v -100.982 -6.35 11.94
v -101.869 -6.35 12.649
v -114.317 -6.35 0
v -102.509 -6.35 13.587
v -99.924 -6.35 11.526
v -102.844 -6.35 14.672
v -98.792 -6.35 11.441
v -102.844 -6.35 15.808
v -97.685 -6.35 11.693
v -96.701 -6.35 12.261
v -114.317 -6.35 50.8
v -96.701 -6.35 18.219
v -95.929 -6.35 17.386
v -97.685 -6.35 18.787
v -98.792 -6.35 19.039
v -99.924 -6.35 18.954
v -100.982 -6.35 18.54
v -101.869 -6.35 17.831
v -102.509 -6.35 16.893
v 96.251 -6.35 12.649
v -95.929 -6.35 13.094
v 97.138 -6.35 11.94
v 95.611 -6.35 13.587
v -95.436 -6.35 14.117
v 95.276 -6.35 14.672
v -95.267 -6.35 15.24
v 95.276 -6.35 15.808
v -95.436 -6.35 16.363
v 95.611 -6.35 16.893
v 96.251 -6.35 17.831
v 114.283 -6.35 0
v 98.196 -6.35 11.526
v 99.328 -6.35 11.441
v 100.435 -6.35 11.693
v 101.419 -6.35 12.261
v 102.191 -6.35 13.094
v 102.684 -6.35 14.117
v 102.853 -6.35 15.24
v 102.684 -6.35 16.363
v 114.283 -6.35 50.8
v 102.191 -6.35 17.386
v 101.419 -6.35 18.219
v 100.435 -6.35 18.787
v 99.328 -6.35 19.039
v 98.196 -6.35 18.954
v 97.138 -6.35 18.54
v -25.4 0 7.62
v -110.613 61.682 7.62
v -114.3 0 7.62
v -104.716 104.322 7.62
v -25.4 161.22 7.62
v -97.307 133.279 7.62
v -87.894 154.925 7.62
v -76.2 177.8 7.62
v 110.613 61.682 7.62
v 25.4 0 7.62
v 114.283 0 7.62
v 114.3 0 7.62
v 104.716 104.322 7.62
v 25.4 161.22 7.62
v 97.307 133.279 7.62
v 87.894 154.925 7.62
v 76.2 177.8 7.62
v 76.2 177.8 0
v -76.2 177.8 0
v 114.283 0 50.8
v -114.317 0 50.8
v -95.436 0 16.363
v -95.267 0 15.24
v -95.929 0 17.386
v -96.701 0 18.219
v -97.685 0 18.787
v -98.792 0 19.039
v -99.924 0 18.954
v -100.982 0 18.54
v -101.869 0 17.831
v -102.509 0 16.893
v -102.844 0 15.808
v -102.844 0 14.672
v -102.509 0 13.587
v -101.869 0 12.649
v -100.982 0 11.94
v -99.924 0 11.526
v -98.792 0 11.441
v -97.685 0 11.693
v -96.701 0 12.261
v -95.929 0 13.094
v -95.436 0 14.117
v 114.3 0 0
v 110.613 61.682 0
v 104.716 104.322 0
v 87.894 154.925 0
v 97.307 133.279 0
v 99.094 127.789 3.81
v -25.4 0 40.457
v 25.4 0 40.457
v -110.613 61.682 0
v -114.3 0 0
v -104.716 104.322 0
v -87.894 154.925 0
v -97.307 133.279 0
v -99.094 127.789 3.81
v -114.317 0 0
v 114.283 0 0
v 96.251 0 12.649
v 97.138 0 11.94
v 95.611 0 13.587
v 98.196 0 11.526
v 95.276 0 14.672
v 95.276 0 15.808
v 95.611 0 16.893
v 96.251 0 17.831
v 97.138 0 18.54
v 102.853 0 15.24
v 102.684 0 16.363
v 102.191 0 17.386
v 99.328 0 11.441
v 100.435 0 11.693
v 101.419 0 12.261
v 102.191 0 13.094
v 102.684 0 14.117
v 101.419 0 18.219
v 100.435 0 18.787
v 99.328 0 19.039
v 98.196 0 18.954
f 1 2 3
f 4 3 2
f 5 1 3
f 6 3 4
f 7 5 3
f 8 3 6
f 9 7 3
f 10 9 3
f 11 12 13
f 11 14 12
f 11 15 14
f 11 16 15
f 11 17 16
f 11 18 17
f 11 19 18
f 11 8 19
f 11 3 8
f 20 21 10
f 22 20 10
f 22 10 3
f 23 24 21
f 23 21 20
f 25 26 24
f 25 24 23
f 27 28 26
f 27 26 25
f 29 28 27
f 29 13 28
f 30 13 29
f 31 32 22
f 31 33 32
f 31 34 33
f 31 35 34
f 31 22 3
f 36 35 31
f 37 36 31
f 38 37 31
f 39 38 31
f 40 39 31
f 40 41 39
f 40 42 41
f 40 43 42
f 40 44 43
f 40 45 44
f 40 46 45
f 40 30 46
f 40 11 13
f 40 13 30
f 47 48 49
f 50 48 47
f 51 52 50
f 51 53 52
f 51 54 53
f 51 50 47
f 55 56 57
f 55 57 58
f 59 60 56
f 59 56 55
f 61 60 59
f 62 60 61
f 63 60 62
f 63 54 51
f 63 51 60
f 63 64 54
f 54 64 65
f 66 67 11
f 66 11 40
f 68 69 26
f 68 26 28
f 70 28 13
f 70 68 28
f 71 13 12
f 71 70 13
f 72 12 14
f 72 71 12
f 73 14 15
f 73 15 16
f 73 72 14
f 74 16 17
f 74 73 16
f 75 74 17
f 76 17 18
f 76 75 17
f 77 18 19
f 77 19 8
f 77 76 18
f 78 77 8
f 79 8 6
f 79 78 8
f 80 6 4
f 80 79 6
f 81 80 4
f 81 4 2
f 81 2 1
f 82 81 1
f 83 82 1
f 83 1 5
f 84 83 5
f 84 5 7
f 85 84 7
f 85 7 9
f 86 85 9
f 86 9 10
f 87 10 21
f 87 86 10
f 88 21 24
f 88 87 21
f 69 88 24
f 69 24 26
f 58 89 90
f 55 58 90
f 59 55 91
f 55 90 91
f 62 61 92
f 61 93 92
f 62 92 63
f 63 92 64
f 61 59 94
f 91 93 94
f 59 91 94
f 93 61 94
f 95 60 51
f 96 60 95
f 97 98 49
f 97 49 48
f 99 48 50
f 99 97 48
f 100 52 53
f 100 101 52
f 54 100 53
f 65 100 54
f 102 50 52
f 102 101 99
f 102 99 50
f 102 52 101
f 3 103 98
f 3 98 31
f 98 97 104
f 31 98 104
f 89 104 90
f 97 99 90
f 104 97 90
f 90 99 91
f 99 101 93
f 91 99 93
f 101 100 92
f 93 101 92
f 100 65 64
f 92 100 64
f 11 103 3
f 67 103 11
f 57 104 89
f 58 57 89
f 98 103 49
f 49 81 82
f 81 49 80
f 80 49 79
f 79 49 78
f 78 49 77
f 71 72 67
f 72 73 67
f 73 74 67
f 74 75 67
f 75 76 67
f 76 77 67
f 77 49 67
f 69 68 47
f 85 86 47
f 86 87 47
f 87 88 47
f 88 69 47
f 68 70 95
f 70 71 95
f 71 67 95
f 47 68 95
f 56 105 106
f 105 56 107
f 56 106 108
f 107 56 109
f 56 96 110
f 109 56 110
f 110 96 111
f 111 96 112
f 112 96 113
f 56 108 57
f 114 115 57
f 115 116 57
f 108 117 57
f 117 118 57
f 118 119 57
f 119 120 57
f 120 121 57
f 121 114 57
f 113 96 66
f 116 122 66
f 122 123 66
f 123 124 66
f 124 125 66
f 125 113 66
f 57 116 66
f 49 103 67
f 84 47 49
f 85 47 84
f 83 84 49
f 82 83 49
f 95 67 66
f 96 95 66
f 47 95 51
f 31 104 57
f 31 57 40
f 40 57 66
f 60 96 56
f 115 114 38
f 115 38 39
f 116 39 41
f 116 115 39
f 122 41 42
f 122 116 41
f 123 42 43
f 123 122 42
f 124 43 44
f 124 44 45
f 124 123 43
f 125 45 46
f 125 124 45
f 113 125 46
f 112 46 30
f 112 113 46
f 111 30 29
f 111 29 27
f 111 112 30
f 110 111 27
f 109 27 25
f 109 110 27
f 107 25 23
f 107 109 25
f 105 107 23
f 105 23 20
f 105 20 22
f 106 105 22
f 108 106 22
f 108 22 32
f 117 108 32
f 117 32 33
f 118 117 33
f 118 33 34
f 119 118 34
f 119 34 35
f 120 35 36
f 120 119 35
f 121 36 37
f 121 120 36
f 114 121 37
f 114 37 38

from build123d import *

# Parameters (mm, degrees)
F1_W          = 228.6
F1_H          = 50.8
F1_R          = 3.81
F2_DEPTH      = 6.35
F3_DEPTH      = 7.62
F5_DEPTH      = 25.4
F5_DEPTH_BACK = 25.4


with BuildPart() as f2:
    # F1 (on Front) → F2 (new body)
    with BuildSketch(Plane.XZ):
        with Locations((-0.0165204967, 25.4)):
            Rectangle(F1_W, F1_H)
        with Locations((-99.0765204967, 15.24)):
            Circle(F1_R, mode=Mode.SUBTRACT)
        with Locations((99.0434795033, 15.24)):
            Circle(F1_R, mode=Mode.SUBTRACT)
    extrude(amount=F2_DEPTH)

    # F0 (on Top) → F3 (join)
    with BuildSketch(Plane.XY):
        with BuildLine():
            Line((-114.3, 0), (0, 0))
            Line((0, 0), (114.3, 0))
            add(Edge.make_bspline(
                [(114.3, 0), (112.9042055321, 50.9900506367), (104.7924183286, 129.6019823877), (85.741828675, 158.2428378306), (76.2, 177.8)],
                knots=[0, 0, 0, 0, 0.604684, 1, 1, 1, 1], degree=3))
            Line((76.2, 177.8), (0, 177.8))
            Line((0, 177.8), (-76.2, 177.8))
            add(Edge.make_bspline(
                [(-114.3, 0), (-112.9042055321, 50.9900506367), (-104.7924183286, 129.6019823877), (-85.741828675, 158.2428378306), (-76.2, 177.8)],
                knots=[0, 0, 0, 0, 0.604684, 1, 1, 1, 1], degree=3))
        make_face()
    extrude(amount=F3_DEPTH)

    # F4 (on Right) → F5 (join, two sides)
    with BuildSketch(Plane.YZ) as f5_sk:
        Polygon((161.2199991941, 7.62), (0, 40.4569857569), (0, 7.62), align=None)
    extrude(amount=F5_DEPTH)
    extrude(f5_sk.sketch, amount=-F5_DEPTH_BACK)


solid = f2.part
